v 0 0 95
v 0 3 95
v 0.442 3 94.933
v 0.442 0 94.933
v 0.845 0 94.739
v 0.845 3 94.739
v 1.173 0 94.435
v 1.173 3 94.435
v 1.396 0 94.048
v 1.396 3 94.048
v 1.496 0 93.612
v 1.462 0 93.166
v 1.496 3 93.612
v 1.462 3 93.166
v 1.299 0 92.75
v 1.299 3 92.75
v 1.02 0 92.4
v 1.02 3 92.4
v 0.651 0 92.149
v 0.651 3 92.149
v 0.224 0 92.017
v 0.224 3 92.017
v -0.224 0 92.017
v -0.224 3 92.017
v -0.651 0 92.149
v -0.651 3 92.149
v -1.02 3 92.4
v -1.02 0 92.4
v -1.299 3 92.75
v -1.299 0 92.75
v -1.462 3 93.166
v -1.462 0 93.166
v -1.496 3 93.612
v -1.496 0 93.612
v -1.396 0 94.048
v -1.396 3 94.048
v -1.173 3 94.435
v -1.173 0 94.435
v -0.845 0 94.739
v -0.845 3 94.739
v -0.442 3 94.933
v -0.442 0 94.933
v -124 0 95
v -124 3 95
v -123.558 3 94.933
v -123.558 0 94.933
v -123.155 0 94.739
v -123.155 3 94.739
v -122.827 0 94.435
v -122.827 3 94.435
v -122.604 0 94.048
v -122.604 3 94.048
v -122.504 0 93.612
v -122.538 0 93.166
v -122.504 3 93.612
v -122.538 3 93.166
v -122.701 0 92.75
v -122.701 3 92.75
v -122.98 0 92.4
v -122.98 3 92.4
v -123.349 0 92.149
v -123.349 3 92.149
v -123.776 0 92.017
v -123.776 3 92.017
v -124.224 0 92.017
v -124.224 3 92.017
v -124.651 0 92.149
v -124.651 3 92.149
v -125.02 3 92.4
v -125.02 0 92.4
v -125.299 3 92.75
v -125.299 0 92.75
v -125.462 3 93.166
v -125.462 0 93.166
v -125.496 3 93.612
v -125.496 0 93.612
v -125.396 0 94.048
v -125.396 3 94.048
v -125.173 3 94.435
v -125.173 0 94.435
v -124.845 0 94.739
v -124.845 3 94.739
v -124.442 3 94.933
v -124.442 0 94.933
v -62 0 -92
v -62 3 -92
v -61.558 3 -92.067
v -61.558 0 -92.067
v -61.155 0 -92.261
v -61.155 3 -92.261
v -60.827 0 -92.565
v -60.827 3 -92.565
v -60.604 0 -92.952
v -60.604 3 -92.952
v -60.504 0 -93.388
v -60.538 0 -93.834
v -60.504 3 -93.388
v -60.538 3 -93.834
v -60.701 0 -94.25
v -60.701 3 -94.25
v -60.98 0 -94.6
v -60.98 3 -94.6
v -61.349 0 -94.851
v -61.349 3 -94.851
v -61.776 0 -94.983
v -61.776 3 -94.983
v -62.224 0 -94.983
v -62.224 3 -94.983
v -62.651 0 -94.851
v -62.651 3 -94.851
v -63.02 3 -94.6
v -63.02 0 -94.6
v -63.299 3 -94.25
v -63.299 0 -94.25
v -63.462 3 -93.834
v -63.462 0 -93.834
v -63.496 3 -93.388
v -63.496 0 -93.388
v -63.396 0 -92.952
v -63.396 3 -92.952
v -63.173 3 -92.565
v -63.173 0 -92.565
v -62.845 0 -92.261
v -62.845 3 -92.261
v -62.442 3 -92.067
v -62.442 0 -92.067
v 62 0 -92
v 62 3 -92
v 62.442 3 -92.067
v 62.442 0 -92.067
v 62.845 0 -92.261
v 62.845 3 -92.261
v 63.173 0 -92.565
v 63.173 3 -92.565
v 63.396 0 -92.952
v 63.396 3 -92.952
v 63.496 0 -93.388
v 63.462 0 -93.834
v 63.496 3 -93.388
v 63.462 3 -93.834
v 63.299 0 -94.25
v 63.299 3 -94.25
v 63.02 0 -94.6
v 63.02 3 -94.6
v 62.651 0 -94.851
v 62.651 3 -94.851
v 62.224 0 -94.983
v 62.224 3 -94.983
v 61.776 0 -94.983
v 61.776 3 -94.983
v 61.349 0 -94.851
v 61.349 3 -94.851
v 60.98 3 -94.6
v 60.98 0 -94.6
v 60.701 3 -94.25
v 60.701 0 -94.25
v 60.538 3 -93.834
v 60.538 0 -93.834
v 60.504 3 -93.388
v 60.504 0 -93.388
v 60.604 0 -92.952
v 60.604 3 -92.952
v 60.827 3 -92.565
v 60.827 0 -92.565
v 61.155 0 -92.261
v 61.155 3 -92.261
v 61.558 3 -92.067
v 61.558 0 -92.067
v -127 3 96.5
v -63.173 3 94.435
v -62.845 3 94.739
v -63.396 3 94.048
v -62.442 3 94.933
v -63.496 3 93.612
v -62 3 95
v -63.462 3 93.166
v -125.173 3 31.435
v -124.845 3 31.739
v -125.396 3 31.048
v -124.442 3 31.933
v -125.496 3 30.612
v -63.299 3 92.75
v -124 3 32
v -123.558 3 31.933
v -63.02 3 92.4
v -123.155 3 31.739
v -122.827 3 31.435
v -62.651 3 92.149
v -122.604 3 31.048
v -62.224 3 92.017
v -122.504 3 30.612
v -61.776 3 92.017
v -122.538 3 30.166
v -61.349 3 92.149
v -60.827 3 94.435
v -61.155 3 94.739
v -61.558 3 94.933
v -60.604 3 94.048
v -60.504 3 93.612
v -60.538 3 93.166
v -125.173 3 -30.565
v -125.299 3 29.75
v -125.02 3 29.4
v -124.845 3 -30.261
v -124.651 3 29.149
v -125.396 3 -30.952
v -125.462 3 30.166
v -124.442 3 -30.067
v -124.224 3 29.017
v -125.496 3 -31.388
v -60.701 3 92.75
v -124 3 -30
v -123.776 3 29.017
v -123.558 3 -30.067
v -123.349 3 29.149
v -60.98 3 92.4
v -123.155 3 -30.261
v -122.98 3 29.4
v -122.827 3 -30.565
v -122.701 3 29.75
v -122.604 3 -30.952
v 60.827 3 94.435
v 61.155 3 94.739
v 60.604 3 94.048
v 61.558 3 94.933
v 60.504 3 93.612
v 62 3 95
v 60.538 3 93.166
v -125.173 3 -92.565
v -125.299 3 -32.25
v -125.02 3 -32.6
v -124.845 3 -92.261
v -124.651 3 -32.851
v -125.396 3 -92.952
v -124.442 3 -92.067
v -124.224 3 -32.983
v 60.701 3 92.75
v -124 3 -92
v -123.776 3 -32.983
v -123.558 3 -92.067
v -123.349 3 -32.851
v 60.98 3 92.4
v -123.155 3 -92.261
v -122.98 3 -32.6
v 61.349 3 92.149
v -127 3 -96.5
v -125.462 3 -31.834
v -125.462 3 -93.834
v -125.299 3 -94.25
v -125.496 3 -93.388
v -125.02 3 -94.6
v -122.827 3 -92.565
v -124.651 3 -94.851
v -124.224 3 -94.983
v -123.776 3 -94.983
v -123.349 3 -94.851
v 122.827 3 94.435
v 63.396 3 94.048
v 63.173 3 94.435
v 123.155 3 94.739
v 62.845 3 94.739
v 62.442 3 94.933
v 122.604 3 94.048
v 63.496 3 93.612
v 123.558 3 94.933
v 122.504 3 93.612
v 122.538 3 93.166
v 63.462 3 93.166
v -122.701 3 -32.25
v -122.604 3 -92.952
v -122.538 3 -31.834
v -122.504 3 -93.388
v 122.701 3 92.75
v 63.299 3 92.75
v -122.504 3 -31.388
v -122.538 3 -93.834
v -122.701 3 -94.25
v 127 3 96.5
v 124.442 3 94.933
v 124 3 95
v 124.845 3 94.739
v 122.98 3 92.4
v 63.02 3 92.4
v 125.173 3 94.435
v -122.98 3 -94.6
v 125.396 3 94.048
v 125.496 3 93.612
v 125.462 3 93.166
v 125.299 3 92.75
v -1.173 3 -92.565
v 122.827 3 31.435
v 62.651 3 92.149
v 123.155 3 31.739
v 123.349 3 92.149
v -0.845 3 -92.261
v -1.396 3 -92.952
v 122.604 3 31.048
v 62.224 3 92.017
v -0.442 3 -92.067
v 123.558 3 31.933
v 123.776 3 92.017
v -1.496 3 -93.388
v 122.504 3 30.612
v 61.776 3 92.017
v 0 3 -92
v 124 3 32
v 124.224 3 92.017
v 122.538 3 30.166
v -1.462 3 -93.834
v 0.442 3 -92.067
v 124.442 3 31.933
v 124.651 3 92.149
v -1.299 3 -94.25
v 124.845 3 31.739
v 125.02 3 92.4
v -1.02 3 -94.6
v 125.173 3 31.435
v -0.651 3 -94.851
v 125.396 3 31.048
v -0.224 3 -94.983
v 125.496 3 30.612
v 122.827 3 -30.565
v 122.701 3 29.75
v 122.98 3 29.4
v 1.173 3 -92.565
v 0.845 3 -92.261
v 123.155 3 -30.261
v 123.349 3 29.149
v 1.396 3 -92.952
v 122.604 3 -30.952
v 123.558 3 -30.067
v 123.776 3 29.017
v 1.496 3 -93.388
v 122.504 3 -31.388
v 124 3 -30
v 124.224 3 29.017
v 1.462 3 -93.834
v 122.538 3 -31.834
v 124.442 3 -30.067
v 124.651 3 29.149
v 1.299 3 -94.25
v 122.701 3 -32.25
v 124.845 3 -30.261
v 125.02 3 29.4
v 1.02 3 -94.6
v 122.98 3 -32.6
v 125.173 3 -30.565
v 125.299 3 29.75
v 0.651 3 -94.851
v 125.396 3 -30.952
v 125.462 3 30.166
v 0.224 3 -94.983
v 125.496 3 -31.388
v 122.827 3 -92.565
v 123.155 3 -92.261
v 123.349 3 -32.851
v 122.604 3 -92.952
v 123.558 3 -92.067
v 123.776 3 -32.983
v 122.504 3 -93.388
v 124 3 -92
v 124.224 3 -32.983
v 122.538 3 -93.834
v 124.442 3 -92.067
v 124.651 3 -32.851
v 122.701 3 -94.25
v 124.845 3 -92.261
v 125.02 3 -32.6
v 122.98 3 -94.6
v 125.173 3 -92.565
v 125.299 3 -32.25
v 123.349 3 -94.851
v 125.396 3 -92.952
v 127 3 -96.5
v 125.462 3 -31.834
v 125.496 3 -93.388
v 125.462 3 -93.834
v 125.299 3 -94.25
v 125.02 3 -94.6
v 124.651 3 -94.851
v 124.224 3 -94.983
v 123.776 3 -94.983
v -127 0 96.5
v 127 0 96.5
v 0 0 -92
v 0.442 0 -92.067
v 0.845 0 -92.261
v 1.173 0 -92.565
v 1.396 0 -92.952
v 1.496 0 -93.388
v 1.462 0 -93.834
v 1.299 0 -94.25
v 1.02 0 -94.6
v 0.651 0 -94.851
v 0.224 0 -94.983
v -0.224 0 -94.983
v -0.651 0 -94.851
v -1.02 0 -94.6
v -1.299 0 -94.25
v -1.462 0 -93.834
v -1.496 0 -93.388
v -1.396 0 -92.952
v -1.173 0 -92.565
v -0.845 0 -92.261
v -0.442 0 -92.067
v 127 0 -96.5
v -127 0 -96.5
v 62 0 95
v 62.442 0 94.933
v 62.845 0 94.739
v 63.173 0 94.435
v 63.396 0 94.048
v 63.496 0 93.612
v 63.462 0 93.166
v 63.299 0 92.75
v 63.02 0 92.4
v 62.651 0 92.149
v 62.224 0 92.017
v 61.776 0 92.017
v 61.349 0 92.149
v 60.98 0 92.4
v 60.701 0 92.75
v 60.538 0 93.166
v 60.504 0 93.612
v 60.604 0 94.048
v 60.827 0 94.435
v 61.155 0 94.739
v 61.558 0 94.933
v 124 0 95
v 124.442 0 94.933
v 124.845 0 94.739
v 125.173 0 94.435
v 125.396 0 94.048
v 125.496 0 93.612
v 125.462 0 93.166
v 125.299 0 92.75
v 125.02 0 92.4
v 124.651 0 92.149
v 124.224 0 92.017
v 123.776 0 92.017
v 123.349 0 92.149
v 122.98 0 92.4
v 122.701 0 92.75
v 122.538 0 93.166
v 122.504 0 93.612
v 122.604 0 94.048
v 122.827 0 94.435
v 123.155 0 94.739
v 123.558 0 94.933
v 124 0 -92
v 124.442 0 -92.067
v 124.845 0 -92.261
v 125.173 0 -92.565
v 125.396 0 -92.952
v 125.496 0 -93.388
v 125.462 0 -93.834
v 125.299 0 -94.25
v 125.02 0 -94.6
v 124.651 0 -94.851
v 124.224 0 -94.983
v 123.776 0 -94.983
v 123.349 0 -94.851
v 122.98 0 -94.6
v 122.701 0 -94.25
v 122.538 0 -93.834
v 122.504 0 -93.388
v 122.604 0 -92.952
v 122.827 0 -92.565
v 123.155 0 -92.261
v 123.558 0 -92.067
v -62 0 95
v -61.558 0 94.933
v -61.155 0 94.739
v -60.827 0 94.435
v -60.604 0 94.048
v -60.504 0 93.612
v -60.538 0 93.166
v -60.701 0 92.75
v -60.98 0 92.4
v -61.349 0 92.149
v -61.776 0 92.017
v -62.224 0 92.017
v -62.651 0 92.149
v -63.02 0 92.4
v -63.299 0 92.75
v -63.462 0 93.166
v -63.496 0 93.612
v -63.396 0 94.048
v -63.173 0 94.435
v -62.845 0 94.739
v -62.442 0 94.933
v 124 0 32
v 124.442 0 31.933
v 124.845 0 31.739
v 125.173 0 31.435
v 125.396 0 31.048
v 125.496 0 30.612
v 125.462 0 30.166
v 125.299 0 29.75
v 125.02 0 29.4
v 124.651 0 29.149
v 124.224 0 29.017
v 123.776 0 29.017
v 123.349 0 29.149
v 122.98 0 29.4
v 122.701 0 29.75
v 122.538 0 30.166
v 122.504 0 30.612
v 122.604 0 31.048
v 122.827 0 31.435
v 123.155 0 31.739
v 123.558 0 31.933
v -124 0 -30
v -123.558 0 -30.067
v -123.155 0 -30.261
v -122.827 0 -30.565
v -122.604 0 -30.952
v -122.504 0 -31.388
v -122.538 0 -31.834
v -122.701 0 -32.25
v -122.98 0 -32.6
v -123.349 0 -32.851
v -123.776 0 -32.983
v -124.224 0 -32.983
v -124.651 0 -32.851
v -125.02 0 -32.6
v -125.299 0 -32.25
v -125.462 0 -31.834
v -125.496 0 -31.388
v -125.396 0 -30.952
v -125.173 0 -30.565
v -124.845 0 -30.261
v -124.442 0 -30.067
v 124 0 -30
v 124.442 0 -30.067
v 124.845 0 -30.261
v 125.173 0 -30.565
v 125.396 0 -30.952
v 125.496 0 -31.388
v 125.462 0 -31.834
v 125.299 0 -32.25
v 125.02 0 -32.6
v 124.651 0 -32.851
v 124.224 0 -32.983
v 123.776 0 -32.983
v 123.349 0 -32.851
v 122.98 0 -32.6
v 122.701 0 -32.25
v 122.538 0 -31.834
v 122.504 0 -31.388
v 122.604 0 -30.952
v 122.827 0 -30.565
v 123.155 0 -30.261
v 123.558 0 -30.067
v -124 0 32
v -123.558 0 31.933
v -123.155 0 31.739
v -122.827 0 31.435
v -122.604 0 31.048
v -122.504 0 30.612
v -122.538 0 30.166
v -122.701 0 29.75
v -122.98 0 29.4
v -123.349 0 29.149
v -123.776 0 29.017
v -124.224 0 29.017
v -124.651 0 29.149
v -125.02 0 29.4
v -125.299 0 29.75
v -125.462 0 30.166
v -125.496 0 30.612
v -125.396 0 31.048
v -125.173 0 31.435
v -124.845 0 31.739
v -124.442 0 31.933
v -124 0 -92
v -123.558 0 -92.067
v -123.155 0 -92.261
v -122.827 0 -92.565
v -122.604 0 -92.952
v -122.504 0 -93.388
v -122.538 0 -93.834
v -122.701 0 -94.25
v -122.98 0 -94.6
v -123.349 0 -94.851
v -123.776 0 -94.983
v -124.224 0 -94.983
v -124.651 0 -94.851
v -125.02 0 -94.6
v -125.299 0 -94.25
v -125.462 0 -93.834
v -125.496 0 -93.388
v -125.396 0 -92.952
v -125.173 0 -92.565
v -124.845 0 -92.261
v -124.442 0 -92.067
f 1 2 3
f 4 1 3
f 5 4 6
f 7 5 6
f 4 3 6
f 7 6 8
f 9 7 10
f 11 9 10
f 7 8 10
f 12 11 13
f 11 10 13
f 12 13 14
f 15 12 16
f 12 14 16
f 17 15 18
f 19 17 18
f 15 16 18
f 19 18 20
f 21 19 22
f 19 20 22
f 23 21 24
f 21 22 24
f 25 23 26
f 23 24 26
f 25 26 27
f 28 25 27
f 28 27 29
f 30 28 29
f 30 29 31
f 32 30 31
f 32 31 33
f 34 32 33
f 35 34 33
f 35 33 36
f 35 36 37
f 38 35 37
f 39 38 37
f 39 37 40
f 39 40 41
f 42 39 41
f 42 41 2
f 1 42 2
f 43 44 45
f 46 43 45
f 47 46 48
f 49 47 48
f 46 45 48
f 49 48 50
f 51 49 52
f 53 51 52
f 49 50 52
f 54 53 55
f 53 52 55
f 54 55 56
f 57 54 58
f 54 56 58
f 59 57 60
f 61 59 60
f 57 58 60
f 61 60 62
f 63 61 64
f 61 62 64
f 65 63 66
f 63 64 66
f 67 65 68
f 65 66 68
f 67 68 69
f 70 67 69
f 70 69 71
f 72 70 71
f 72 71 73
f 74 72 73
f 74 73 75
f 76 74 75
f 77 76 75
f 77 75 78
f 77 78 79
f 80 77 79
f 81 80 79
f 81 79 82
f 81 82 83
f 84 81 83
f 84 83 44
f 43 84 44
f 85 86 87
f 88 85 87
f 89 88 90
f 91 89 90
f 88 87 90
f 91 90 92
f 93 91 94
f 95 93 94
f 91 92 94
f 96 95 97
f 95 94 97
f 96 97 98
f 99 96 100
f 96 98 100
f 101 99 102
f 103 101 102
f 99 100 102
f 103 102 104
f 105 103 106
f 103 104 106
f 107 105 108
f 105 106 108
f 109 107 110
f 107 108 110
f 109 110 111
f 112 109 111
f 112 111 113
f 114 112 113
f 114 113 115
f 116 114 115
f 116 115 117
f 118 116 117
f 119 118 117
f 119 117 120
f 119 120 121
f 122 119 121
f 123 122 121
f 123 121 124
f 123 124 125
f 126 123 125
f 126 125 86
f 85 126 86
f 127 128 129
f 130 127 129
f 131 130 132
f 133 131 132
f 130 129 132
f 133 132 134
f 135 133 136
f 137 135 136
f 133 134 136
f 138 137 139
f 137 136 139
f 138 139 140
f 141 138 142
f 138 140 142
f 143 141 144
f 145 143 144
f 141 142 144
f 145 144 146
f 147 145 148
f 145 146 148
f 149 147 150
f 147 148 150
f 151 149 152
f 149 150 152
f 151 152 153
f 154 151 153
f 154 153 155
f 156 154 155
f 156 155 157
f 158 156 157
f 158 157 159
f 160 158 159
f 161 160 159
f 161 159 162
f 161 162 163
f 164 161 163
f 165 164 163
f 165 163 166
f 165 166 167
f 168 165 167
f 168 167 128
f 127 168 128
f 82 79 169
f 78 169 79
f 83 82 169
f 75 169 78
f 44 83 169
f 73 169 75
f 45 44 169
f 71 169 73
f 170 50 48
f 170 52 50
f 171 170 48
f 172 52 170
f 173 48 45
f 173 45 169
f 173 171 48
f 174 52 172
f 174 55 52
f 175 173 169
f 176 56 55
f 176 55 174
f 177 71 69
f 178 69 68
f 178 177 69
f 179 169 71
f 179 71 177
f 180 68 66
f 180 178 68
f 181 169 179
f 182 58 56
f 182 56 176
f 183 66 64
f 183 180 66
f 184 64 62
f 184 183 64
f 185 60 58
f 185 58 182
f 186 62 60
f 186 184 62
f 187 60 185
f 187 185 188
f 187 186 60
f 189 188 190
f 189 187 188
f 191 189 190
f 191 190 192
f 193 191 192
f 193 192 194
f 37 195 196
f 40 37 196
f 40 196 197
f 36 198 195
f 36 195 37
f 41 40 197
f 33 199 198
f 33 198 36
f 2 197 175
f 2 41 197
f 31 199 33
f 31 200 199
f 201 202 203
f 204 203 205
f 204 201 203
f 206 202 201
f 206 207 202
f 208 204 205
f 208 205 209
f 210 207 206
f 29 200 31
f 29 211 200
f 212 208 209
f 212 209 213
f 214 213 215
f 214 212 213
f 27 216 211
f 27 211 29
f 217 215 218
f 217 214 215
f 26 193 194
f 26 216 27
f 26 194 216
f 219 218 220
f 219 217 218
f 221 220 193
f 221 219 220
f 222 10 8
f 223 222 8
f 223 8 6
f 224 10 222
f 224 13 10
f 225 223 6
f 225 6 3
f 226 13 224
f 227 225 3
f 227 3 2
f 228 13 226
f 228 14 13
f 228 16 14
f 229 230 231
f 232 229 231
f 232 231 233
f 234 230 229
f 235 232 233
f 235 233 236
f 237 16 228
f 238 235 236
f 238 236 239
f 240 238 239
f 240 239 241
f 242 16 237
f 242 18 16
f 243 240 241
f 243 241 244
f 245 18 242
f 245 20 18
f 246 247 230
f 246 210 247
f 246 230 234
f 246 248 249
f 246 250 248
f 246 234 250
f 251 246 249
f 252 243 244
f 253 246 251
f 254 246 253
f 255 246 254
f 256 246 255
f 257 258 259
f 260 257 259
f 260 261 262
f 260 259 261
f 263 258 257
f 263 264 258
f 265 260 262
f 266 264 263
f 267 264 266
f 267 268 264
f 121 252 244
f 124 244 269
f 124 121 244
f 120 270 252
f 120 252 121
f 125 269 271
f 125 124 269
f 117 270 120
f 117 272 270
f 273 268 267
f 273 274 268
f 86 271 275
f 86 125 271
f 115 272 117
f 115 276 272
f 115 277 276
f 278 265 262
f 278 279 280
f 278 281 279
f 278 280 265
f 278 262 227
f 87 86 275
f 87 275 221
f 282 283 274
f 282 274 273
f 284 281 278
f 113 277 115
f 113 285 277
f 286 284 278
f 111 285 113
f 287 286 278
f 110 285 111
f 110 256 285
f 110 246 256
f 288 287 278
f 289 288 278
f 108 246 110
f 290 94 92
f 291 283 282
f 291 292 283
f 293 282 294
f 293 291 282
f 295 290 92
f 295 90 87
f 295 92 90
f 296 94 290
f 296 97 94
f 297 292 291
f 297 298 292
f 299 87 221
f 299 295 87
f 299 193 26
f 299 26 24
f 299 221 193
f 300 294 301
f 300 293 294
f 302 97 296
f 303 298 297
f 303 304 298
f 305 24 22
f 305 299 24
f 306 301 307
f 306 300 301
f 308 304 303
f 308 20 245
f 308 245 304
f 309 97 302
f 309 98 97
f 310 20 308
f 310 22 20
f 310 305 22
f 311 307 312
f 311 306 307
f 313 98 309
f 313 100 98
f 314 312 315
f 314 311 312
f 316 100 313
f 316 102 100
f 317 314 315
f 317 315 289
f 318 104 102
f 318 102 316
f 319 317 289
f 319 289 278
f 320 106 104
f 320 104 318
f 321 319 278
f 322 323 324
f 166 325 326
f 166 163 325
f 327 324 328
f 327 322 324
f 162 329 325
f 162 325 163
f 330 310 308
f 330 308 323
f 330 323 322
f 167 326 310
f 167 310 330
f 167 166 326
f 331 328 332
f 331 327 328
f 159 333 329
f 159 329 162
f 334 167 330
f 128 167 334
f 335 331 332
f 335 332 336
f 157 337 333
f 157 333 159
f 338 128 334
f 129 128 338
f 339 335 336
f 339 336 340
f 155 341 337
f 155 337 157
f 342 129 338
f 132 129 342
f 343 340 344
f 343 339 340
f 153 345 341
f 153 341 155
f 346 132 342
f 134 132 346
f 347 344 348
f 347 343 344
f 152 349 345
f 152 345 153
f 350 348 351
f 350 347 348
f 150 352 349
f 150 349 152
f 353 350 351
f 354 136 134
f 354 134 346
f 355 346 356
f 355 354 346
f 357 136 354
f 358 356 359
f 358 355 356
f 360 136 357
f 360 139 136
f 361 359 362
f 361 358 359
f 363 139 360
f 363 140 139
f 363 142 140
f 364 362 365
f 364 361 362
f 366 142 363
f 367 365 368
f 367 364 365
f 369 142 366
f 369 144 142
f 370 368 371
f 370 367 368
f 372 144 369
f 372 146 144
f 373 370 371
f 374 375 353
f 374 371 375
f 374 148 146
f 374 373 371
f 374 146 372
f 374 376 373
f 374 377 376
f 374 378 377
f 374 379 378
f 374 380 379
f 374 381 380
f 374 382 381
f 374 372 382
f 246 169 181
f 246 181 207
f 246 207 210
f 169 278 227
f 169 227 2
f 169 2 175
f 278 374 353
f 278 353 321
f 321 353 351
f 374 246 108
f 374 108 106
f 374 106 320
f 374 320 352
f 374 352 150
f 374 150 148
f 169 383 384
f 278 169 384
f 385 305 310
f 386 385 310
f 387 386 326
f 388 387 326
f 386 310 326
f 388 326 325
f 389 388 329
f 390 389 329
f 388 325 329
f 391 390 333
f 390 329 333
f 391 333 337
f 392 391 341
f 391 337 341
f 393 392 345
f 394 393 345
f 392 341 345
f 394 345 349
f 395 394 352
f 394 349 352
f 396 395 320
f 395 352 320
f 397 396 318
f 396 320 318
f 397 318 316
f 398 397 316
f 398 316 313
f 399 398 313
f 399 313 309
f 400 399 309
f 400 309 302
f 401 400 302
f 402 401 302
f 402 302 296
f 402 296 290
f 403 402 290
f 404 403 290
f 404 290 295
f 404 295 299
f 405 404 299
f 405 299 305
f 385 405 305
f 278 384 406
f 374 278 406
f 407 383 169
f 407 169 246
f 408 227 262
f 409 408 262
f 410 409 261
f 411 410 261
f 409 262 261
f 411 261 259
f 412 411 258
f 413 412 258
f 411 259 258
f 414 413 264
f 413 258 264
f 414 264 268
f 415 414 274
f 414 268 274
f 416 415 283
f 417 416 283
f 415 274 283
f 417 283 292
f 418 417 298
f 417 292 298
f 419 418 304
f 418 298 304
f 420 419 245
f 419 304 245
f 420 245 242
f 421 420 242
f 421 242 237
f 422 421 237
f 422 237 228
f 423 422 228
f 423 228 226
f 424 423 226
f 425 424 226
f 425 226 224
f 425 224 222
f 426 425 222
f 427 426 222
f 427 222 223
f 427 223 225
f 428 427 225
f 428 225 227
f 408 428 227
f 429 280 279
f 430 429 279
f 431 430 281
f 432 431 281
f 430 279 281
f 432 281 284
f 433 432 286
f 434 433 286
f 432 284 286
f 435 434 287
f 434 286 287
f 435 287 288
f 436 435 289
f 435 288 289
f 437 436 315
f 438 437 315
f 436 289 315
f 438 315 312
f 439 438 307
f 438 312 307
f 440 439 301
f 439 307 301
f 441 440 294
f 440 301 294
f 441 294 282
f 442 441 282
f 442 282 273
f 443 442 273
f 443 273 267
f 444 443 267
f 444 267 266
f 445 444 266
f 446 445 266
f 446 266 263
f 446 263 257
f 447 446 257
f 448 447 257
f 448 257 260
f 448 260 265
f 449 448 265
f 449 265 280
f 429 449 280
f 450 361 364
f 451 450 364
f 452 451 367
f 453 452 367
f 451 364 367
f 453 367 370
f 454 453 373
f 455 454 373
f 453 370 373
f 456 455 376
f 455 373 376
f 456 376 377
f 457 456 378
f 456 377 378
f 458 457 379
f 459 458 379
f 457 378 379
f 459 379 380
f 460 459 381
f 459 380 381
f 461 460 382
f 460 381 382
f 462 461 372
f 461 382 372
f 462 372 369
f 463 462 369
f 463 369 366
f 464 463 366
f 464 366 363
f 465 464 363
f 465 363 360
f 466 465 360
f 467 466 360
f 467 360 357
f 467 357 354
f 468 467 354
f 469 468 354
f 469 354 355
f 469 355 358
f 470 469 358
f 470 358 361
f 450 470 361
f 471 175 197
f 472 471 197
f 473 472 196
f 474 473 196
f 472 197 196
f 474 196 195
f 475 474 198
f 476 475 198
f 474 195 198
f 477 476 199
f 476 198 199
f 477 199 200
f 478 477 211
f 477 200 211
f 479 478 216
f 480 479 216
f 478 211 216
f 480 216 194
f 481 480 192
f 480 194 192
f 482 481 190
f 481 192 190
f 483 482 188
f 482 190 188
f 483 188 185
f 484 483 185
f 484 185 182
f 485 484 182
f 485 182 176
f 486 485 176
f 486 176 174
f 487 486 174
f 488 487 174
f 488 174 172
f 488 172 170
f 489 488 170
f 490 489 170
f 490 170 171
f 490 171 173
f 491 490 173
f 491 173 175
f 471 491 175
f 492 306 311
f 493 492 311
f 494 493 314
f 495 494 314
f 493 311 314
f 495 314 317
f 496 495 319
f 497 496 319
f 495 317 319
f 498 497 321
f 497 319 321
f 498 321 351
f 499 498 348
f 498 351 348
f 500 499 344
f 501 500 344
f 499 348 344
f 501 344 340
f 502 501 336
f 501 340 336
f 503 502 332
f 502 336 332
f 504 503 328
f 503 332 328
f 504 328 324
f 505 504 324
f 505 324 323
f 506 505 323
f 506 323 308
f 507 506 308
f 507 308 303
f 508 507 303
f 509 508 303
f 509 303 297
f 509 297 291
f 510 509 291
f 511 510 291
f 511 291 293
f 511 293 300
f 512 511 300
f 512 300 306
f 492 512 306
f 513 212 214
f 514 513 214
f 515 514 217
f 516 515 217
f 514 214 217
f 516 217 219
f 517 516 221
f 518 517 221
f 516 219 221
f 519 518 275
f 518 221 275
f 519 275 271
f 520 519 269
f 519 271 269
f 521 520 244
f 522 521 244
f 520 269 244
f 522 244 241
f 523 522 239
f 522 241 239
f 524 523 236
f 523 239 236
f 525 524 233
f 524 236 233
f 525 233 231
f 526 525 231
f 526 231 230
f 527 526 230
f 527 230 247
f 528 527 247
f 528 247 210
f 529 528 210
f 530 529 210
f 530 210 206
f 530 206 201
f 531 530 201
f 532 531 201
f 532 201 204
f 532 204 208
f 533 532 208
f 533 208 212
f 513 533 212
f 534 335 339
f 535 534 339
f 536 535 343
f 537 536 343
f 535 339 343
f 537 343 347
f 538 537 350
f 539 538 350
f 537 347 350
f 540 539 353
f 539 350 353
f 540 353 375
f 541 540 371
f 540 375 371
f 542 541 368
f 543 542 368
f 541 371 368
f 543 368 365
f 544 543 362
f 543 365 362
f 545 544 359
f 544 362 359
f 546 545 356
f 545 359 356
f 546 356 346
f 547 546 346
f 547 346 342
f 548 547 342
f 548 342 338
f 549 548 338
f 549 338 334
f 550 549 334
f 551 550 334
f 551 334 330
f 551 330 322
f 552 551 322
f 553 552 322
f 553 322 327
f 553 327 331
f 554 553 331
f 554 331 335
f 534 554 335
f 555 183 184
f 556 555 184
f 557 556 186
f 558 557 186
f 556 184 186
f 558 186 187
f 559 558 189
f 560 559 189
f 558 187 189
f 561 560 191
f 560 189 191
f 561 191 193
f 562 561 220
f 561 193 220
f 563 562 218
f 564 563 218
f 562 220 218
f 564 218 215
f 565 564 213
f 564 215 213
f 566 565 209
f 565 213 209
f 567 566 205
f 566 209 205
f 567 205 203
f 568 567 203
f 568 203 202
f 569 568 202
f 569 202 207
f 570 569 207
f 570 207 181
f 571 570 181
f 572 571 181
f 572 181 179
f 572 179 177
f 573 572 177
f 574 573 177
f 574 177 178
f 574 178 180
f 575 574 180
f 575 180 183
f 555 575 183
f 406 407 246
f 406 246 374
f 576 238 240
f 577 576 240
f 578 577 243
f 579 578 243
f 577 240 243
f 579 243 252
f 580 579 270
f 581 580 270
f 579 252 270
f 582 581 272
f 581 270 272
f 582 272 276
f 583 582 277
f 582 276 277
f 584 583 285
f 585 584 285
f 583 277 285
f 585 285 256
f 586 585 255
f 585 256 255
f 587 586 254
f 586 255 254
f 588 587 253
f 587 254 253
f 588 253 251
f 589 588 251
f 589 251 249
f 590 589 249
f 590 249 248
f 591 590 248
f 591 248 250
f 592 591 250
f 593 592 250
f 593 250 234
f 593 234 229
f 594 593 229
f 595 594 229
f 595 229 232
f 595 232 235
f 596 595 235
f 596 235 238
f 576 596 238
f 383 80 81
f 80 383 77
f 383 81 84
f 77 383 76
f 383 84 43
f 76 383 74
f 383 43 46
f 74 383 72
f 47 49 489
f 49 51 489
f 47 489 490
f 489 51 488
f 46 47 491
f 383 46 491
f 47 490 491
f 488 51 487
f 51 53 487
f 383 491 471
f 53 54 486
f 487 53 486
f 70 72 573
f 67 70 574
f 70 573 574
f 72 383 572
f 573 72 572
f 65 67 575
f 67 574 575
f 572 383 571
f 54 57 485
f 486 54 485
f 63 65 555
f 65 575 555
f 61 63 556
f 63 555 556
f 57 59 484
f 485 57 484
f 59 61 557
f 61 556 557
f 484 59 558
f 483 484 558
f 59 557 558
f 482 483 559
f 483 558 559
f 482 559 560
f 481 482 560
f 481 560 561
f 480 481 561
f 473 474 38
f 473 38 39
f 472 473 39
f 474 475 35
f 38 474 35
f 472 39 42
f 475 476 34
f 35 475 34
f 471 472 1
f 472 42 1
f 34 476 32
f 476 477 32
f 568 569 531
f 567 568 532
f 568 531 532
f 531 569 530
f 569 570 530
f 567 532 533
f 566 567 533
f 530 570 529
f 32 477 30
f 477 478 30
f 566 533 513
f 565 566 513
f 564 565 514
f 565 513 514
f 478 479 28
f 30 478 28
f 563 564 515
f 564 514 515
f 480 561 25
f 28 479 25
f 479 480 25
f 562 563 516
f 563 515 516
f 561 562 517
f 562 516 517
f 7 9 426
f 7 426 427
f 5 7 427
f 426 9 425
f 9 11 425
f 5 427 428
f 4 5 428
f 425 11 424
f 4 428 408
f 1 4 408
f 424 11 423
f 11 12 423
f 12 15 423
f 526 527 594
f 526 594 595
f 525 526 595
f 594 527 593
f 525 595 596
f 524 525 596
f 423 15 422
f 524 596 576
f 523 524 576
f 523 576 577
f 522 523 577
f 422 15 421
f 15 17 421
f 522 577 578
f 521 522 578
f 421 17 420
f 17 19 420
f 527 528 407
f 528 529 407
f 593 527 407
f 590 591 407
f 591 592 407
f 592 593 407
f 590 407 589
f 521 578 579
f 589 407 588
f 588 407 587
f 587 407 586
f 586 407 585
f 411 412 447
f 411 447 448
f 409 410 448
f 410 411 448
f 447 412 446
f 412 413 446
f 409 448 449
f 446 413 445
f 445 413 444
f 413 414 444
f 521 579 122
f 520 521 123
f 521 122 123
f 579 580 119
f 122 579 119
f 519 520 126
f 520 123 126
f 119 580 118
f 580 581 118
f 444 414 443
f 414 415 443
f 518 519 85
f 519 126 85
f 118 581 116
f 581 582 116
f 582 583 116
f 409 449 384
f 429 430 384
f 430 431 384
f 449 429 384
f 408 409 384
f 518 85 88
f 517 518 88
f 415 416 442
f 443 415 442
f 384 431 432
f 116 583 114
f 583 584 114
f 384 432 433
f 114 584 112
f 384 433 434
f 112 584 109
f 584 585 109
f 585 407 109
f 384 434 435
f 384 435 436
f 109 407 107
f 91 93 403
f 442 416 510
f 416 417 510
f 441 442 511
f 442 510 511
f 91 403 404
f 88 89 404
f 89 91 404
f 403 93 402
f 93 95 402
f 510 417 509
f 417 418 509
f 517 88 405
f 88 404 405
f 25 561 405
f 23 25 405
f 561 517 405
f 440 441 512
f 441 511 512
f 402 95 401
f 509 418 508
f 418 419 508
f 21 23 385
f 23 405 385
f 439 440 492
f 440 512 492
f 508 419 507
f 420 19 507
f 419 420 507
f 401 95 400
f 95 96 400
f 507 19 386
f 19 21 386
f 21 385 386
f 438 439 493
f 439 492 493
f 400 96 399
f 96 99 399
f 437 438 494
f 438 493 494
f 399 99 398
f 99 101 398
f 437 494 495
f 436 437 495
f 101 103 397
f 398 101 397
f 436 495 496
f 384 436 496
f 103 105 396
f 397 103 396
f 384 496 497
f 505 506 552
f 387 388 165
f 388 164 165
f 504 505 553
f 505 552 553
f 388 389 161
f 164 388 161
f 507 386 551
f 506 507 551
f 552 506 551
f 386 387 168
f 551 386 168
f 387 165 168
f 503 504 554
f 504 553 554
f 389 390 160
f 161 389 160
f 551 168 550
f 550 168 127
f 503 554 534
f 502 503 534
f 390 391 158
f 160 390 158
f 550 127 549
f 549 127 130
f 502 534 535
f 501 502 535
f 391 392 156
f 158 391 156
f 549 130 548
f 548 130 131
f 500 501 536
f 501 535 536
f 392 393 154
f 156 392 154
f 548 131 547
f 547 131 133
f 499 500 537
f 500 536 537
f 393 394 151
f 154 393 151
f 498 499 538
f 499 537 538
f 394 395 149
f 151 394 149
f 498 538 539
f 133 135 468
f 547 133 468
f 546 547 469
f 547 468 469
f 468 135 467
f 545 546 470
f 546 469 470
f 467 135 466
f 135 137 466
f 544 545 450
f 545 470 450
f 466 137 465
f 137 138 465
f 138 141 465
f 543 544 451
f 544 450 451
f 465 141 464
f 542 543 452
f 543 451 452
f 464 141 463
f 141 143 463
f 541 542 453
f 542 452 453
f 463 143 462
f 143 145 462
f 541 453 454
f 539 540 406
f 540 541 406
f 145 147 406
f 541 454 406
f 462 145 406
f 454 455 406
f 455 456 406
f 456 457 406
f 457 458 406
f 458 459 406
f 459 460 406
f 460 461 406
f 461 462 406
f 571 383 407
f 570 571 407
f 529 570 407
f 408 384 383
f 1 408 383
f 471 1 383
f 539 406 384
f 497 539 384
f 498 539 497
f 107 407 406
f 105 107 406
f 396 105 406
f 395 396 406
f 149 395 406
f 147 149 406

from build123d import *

# Parameters (mm, degrees)
SKETCH1_W            = 254
SKETCH1_H            = 193
BOSS_EXTRUDE1_DEPTH  = 3
CUT_EXTRUDE1_REACH   = 161.531
SKETCH2_R            = 1.5
LPATTERN1_COUNT      = 5
LPATTERN1_PITCH      = 62
LPATTERN1_COUNT_DIR2 = 2
LPATTERN1_PITCH_DIR2 = 187
LPATTERN2_COUNT      = 3
LPATTERN2_PITCH      = 62
LPATTERN2_COUNT_DIR2 = 2
LPATTERN2_PITCH_DIR2 = 248


with BuildPart() as part:
    # Sketch1 → Boss-Extrude1 (new body)
    with BuildSketch(Plane(origin=(0, 0, 0), x_dir=(1, 0, 0), z_dir=(0, 1, 0))):
        Rectangle(SKETCH1_W, SKETCH1_H)
    extrude(amount=BOSS_EXTRUDE1_DEPTH)

    # Sketch2 → Cut-Extrude1 (cut, up to next)
    with BuildSketch(Plane(origin=(0, 3, 0), x_dir=(1, 0, 0), z_dir=(0, 1, 0)), mode=Mode.PRIVATE) as cut_extrude1_sk1:
        with Locations(Location((-124, 93.5, 0), (0, 0, 270))):
            Circle(SKETCH2_R)
    cut_extrude1_tool1 = extrude(cut_extrude1_sk1.sketch, amount=-CUT_EXTRUDE1_REACH, mode=Mode.PRIVATE) & part.part
    cut_extrude1 = cut_extrude1_tool1.solids().sort_by_distance((-124, 3, -93.5))[0]
    add(cut_extrude1, mode=Mode.SUBTRACT)

    # LPattern1: Cut-Extrude1 5 × 2
    with Locations(*[(i * LPATTERN1_PITCH, 0, j * LPATTERN1_PITCH_DIR2) for i in range(LPATTERN1_COUNT) for j in range(LPATTERN1_COUNT_DIR2) if (i, j) != (0, 0)]):
        add(cut_extrude1, mode=Mode.SUBTRACT)

    # LPattern2: Cut-Extrude1 3 × 2
    with Locations(*[(j * LPATTERN2_PITCH_DIR2, 0, i * LPATTERN2_PITCH) for i in range(LPATTERN2_COUNT) for j in range(LPATTERN2_COUNT_DIR2) if (i, j) != (0, 0)]):
        add(cut_extrude1, mode=Mode.SUBTRACT)


solid = part.part
